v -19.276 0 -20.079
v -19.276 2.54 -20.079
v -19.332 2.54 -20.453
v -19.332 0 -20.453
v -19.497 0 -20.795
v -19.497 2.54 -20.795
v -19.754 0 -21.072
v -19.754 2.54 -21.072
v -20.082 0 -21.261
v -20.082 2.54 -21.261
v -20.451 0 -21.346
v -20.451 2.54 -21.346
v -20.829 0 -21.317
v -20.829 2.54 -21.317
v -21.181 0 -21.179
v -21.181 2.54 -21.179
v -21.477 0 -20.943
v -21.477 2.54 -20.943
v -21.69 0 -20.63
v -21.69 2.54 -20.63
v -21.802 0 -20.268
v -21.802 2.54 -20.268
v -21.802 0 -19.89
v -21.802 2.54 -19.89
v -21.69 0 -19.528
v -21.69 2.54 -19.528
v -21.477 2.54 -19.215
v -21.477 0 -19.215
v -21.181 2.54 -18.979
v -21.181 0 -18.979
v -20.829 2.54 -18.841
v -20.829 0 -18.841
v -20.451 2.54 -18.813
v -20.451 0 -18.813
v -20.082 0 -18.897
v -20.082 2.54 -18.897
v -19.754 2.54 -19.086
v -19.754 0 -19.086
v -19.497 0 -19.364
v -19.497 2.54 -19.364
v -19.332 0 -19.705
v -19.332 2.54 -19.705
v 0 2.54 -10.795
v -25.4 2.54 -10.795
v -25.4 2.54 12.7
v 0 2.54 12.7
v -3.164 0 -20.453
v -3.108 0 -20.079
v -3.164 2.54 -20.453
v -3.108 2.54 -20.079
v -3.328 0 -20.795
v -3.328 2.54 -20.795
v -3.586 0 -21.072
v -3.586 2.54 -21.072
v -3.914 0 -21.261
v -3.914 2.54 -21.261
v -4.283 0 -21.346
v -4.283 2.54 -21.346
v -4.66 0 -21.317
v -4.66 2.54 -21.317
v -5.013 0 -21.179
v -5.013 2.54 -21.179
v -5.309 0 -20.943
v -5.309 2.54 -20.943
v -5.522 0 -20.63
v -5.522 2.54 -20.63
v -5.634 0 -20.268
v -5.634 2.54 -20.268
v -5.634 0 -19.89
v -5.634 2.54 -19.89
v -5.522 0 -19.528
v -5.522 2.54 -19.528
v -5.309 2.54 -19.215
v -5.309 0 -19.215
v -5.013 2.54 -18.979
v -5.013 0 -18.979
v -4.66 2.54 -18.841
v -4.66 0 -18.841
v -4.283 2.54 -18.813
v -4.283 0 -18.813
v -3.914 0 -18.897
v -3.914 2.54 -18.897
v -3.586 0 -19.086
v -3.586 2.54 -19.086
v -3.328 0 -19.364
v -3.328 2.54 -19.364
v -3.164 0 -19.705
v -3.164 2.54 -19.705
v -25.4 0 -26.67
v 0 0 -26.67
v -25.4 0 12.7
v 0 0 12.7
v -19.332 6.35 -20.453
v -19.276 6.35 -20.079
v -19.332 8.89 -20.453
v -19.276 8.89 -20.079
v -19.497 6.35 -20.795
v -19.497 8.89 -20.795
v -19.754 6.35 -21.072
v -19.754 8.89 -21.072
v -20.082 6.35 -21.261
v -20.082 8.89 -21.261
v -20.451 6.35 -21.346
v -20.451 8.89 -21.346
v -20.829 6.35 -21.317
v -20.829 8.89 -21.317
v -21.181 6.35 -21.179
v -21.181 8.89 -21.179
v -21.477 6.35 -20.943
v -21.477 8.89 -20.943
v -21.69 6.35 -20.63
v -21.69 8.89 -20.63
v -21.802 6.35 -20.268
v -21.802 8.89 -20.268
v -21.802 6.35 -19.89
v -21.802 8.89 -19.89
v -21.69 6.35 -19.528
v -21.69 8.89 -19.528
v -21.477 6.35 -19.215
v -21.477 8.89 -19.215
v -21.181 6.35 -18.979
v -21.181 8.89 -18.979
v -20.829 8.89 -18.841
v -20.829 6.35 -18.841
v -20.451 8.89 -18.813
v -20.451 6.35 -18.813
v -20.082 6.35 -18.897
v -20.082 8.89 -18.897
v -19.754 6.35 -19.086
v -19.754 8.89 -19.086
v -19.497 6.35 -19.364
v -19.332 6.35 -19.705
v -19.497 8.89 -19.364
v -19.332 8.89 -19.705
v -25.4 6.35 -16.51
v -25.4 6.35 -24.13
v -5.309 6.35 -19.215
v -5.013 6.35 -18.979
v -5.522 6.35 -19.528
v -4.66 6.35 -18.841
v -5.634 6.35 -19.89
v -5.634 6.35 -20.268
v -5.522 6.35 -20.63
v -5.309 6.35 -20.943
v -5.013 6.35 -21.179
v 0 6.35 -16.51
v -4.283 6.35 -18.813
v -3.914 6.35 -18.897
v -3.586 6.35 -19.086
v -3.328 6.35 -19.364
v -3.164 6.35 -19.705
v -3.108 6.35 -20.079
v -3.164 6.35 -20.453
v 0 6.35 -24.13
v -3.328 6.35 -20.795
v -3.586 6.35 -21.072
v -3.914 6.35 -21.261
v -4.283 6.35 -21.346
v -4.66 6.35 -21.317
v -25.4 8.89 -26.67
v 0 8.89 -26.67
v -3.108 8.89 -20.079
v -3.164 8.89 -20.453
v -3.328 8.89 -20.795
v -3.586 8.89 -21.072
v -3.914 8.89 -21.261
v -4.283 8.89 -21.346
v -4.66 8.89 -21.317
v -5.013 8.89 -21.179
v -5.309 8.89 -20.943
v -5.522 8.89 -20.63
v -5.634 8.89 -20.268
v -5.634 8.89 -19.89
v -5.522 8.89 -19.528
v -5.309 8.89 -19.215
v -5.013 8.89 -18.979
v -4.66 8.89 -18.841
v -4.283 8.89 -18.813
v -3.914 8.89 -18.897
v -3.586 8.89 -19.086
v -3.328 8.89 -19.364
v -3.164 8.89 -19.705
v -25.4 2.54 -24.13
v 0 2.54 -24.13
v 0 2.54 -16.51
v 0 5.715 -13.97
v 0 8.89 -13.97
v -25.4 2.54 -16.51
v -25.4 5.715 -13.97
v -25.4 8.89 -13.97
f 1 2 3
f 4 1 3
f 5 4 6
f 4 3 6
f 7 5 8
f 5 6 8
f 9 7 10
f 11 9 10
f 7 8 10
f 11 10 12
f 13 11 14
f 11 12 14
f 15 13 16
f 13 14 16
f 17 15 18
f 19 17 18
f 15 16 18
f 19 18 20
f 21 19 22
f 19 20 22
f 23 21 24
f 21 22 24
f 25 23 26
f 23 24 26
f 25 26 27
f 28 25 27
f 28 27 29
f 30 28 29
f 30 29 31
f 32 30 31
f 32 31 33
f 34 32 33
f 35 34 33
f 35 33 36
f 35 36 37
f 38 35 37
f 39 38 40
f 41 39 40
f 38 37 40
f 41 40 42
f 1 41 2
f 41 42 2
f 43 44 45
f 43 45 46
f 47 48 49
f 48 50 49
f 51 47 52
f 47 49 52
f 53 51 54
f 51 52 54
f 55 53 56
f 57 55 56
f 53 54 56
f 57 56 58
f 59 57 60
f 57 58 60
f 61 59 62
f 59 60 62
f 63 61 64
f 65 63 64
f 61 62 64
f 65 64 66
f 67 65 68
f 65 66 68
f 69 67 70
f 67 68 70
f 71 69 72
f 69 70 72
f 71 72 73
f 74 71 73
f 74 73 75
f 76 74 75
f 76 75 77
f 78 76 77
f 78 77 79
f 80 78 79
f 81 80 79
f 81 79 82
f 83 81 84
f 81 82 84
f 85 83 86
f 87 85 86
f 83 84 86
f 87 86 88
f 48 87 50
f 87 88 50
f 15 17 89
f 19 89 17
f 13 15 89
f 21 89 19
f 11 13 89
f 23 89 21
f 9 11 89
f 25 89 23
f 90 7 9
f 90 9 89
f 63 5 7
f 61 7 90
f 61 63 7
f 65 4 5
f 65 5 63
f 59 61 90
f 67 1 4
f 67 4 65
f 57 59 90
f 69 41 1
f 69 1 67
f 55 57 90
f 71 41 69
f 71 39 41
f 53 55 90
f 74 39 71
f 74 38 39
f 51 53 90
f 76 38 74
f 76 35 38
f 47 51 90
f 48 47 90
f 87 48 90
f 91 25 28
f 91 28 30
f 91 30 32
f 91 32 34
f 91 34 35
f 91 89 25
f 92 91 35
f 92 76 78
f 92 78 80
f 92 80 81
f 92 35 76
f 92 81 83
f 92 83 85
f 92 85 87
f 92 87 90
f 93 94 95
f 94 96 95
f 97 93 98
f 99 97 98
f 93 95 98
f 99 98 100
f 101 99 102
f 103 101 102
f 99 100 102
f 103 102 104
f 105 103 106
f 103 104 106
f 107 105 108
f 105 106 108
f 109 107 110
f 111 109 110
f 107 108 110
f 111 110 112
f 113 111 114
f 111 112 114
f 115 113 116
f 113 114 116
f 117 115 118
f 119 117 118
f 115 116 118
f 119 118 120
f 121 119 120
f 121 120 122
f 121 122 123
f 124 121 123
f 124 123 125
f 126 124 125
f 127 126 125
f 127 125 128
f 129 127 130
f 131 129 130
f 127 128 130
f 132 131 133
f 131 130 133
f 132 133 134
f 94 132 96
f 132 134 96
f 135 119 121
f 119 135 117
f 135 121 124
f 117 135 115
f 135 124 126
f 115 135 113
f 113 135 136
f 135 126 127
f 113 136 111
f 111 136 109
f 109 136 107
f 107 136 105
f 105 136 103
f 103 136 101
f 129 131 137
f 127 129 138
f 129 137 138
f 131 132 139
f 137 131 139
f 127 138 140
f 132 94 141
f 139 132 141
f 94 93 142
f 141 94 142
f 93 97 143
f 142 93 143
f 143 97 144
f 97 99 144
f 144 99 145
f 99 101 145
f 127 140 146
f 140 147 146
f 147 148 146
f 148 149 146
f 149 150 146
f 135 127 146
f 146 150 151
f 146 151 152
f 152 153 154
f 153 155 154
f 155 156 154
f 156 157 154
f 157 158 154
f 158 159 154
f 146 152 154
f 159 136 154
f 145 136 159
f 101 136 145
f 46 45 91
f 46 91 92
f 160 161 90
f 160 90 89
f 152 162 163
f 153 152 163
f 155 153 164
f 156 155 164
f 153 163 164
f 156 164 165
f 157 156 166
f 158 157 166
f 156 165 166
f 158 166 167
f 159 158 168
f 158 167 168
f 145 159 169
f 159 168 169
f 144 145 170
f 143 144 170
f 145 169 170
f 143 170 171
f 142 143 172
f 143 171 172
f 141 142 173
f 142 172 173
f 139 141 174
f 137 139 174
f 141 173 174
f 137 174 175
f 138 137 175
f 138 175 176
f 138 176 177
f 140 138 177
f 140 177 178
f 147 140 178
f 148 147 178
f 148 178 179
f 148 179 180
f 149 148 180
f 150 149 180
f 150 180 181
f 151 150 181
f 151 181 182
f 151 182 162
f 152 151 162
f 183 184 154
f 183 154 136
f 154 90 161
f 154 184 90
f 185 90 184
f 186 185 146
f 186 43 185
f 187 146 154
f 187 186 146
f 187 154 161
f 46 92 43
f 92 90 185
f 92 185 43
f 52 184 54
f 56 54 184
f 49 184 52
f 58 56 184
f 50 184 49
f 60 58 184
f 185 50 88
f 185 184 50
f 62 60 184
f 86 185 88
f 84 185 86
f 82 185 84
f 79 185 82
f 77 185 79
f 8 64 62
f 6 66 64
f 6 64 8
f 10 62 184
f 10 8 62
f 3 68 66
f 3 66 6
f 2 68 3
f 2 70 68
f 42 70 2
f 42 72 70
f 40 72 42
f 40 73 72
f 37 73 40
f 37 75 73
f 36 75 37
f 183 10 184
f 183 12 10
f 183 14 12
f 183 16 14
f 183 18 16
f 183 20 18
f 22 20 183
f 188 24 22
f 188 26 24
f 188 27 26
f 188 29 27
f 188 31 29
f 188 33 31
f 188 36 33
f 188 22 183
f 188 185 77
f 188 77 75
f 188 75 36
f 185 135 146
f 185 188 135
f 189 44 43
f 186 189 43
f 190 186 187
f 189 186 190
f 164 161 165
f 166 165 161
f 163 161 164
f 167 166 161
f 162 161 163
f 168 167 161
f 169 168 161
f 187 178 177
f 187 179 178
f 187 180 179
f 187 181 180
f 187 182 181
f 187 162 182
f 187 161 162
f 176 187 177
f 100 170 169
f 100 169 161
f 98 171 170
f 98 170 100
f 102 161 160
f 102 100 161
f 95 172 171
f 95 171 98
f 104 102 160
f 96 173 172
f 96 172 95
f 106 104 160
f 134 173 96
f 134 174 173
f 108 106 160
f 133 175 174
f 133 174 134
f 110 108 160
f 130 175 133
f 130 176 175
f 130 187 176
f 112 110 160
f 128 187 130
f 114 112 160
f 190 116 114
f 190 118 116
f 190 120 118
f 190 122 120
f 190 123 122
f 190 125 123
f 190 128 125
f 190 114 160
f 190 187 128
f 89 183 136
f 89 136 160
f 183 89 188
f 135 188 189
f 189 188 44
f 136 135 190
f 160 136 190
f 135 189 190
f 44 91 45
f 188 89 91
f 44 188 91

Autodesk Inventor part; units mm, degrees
ref_plane "YZ Plane" through (0, 0, 0) normal (1, 0, 0) x (0, 1, 0)
ref_plane "XZ Plane" through (0, 0, 0) normal (0, 1, 0) x (-1, 0, 0)
ref_plane "XY Plane" through (0, 0, 0) normal (0, 0, 1) x (1, 0, 0)
sketch "Sketch1" plane through (0, 0, 0) normal (0, 1, 0) x (-1, 0, 0)
  line L0 (0, 0) -> (25.4, 0)
  line L1 (25.4, 0) -> (25.4, -25.4)
  line L2 (25.4, -25.4) -> (0, -25.4)
  line L3 (0, -25.4) -> (0, 0)
  dimension "d0" = 25.4
  dimension "d1" = 25.4
extrude "Extrusion1" add sketch "Sketch1" along normal blind 2.54
sketch "Sketch2" plane through (0, 2.54, 0) normal (0, 1, 0) x (1, 0, 0)
  line L0 (0, 25.4) -> (-25.4, 25.4) projected
  line L1 (-25.4, 25.4) -> (0, 25.4)
  line L2 (0, 25.4) -> (0, 24.13)
  line L3 (0, 24.13) -> (-25.4, 24.13)
  line L4 (-25.4, 24.13) -> (-25.4, 25.4)
  line L5 (-12.7, 24.13) -> (-12.7, 16.51)
  line L6 (-12.7, 24.13) -> (-5.08, 24.13) construction
  line L7 (-25.4, 16.51) -> (0, 16.51)
  line L8 (0, 16.51) -> (0, 13.97)
  line L9 (0, 13.97) -> (-25.4, 13.97)
  line L10 (-25.4, 13.97) -> (-25.4, 16.51)
  point P0 (0, 0)
  dimension "d4" = 25.4
  dimension "d5" = 1.27
  dimension "d6" = 7.62
  dimension "d7" = 90
  dimension "d8" = 25.4
  dimension "d9" = 2.54
extrude "Extrusion2" add sketch "Sketch2" along normal blind 3.81
sketch "Sketch3" plane through (0, 6.35, 0) normal (0, 1, 0) x (1, 0, 0)
  line L0 (0, 13.97) -> (0, 16.51) projected
  line L1 (-25.4, 25.4) -> (0, 25.4) projected
  line L2 (0, 13.97) -> (-25.4, 13.97)
  line L3 (-25.4, 13.97) -> (-25.4, 25.4)
  line L4 (-25.4, 25.4) -> (0, 25.4)
  line L5 (0, 25.4) -> (0, 13.97)
  point P0 (0, 0)
extrude "Extrusion3" add sketch "Sketch3" along normal blind 2.54
chamfer "Chamfer1" distance 3.175 angle 45 1 edges at (-12.7, 2.54, -13.97)
sketch "Sketch4" plane through (0, 8.89, 0) normal (0, 1, 0) x (1, 0, 0)
  circle A0 centre (-20.546, 20.0791) radius 1.27
  circle A1 centre (-4.3777, 20.0791) radius 1.27
  point P0 (0, 0)
  dimension "d17" = 2.54
  dimension "d18" = 2.54
extrude "Extrusion4" cut sketch "Sketch4" against normal blind 25.4
sketch "Sketch5" plane through (-25.4, 0, 0) normal (0, 0, 1) x (1, 0, 0)
  line L0 (0, 2.54) -> (25.4, 2.54) projected
  line L1 (25.4, 0) -> (0, 0) projected
  line L2 (0, 2.54) -> (25.4, 2.54)
  line L3 (25.4, 2.54) -> (25.4, 0)
  line L4 (25.4, 0) -> (0, 0)
  line L5 (0, 0) -> (0, 2.54)
extrude "Extrusion5" add sketch "Sketch5" along normal blind 12.7
sketch "Sketch6" plane through (0, 0, -25.4) normal (0, 0, -1) x (-1, 0, 0)
  line L0 (25.4, 0) -> (0, 0) projected
  line L1 (25.4, 0) -> (25.4, 8.89) projected
  line L2 (0, 8.89) -> (25.4, 8.89) projected
  line L3 (0, 0) -> (0, 8.89) projected
extrude "Extrusion6" add sketch "Sketch6" along normal blind 1.27
properties part number "Hotend holder V4 Beltmount"
